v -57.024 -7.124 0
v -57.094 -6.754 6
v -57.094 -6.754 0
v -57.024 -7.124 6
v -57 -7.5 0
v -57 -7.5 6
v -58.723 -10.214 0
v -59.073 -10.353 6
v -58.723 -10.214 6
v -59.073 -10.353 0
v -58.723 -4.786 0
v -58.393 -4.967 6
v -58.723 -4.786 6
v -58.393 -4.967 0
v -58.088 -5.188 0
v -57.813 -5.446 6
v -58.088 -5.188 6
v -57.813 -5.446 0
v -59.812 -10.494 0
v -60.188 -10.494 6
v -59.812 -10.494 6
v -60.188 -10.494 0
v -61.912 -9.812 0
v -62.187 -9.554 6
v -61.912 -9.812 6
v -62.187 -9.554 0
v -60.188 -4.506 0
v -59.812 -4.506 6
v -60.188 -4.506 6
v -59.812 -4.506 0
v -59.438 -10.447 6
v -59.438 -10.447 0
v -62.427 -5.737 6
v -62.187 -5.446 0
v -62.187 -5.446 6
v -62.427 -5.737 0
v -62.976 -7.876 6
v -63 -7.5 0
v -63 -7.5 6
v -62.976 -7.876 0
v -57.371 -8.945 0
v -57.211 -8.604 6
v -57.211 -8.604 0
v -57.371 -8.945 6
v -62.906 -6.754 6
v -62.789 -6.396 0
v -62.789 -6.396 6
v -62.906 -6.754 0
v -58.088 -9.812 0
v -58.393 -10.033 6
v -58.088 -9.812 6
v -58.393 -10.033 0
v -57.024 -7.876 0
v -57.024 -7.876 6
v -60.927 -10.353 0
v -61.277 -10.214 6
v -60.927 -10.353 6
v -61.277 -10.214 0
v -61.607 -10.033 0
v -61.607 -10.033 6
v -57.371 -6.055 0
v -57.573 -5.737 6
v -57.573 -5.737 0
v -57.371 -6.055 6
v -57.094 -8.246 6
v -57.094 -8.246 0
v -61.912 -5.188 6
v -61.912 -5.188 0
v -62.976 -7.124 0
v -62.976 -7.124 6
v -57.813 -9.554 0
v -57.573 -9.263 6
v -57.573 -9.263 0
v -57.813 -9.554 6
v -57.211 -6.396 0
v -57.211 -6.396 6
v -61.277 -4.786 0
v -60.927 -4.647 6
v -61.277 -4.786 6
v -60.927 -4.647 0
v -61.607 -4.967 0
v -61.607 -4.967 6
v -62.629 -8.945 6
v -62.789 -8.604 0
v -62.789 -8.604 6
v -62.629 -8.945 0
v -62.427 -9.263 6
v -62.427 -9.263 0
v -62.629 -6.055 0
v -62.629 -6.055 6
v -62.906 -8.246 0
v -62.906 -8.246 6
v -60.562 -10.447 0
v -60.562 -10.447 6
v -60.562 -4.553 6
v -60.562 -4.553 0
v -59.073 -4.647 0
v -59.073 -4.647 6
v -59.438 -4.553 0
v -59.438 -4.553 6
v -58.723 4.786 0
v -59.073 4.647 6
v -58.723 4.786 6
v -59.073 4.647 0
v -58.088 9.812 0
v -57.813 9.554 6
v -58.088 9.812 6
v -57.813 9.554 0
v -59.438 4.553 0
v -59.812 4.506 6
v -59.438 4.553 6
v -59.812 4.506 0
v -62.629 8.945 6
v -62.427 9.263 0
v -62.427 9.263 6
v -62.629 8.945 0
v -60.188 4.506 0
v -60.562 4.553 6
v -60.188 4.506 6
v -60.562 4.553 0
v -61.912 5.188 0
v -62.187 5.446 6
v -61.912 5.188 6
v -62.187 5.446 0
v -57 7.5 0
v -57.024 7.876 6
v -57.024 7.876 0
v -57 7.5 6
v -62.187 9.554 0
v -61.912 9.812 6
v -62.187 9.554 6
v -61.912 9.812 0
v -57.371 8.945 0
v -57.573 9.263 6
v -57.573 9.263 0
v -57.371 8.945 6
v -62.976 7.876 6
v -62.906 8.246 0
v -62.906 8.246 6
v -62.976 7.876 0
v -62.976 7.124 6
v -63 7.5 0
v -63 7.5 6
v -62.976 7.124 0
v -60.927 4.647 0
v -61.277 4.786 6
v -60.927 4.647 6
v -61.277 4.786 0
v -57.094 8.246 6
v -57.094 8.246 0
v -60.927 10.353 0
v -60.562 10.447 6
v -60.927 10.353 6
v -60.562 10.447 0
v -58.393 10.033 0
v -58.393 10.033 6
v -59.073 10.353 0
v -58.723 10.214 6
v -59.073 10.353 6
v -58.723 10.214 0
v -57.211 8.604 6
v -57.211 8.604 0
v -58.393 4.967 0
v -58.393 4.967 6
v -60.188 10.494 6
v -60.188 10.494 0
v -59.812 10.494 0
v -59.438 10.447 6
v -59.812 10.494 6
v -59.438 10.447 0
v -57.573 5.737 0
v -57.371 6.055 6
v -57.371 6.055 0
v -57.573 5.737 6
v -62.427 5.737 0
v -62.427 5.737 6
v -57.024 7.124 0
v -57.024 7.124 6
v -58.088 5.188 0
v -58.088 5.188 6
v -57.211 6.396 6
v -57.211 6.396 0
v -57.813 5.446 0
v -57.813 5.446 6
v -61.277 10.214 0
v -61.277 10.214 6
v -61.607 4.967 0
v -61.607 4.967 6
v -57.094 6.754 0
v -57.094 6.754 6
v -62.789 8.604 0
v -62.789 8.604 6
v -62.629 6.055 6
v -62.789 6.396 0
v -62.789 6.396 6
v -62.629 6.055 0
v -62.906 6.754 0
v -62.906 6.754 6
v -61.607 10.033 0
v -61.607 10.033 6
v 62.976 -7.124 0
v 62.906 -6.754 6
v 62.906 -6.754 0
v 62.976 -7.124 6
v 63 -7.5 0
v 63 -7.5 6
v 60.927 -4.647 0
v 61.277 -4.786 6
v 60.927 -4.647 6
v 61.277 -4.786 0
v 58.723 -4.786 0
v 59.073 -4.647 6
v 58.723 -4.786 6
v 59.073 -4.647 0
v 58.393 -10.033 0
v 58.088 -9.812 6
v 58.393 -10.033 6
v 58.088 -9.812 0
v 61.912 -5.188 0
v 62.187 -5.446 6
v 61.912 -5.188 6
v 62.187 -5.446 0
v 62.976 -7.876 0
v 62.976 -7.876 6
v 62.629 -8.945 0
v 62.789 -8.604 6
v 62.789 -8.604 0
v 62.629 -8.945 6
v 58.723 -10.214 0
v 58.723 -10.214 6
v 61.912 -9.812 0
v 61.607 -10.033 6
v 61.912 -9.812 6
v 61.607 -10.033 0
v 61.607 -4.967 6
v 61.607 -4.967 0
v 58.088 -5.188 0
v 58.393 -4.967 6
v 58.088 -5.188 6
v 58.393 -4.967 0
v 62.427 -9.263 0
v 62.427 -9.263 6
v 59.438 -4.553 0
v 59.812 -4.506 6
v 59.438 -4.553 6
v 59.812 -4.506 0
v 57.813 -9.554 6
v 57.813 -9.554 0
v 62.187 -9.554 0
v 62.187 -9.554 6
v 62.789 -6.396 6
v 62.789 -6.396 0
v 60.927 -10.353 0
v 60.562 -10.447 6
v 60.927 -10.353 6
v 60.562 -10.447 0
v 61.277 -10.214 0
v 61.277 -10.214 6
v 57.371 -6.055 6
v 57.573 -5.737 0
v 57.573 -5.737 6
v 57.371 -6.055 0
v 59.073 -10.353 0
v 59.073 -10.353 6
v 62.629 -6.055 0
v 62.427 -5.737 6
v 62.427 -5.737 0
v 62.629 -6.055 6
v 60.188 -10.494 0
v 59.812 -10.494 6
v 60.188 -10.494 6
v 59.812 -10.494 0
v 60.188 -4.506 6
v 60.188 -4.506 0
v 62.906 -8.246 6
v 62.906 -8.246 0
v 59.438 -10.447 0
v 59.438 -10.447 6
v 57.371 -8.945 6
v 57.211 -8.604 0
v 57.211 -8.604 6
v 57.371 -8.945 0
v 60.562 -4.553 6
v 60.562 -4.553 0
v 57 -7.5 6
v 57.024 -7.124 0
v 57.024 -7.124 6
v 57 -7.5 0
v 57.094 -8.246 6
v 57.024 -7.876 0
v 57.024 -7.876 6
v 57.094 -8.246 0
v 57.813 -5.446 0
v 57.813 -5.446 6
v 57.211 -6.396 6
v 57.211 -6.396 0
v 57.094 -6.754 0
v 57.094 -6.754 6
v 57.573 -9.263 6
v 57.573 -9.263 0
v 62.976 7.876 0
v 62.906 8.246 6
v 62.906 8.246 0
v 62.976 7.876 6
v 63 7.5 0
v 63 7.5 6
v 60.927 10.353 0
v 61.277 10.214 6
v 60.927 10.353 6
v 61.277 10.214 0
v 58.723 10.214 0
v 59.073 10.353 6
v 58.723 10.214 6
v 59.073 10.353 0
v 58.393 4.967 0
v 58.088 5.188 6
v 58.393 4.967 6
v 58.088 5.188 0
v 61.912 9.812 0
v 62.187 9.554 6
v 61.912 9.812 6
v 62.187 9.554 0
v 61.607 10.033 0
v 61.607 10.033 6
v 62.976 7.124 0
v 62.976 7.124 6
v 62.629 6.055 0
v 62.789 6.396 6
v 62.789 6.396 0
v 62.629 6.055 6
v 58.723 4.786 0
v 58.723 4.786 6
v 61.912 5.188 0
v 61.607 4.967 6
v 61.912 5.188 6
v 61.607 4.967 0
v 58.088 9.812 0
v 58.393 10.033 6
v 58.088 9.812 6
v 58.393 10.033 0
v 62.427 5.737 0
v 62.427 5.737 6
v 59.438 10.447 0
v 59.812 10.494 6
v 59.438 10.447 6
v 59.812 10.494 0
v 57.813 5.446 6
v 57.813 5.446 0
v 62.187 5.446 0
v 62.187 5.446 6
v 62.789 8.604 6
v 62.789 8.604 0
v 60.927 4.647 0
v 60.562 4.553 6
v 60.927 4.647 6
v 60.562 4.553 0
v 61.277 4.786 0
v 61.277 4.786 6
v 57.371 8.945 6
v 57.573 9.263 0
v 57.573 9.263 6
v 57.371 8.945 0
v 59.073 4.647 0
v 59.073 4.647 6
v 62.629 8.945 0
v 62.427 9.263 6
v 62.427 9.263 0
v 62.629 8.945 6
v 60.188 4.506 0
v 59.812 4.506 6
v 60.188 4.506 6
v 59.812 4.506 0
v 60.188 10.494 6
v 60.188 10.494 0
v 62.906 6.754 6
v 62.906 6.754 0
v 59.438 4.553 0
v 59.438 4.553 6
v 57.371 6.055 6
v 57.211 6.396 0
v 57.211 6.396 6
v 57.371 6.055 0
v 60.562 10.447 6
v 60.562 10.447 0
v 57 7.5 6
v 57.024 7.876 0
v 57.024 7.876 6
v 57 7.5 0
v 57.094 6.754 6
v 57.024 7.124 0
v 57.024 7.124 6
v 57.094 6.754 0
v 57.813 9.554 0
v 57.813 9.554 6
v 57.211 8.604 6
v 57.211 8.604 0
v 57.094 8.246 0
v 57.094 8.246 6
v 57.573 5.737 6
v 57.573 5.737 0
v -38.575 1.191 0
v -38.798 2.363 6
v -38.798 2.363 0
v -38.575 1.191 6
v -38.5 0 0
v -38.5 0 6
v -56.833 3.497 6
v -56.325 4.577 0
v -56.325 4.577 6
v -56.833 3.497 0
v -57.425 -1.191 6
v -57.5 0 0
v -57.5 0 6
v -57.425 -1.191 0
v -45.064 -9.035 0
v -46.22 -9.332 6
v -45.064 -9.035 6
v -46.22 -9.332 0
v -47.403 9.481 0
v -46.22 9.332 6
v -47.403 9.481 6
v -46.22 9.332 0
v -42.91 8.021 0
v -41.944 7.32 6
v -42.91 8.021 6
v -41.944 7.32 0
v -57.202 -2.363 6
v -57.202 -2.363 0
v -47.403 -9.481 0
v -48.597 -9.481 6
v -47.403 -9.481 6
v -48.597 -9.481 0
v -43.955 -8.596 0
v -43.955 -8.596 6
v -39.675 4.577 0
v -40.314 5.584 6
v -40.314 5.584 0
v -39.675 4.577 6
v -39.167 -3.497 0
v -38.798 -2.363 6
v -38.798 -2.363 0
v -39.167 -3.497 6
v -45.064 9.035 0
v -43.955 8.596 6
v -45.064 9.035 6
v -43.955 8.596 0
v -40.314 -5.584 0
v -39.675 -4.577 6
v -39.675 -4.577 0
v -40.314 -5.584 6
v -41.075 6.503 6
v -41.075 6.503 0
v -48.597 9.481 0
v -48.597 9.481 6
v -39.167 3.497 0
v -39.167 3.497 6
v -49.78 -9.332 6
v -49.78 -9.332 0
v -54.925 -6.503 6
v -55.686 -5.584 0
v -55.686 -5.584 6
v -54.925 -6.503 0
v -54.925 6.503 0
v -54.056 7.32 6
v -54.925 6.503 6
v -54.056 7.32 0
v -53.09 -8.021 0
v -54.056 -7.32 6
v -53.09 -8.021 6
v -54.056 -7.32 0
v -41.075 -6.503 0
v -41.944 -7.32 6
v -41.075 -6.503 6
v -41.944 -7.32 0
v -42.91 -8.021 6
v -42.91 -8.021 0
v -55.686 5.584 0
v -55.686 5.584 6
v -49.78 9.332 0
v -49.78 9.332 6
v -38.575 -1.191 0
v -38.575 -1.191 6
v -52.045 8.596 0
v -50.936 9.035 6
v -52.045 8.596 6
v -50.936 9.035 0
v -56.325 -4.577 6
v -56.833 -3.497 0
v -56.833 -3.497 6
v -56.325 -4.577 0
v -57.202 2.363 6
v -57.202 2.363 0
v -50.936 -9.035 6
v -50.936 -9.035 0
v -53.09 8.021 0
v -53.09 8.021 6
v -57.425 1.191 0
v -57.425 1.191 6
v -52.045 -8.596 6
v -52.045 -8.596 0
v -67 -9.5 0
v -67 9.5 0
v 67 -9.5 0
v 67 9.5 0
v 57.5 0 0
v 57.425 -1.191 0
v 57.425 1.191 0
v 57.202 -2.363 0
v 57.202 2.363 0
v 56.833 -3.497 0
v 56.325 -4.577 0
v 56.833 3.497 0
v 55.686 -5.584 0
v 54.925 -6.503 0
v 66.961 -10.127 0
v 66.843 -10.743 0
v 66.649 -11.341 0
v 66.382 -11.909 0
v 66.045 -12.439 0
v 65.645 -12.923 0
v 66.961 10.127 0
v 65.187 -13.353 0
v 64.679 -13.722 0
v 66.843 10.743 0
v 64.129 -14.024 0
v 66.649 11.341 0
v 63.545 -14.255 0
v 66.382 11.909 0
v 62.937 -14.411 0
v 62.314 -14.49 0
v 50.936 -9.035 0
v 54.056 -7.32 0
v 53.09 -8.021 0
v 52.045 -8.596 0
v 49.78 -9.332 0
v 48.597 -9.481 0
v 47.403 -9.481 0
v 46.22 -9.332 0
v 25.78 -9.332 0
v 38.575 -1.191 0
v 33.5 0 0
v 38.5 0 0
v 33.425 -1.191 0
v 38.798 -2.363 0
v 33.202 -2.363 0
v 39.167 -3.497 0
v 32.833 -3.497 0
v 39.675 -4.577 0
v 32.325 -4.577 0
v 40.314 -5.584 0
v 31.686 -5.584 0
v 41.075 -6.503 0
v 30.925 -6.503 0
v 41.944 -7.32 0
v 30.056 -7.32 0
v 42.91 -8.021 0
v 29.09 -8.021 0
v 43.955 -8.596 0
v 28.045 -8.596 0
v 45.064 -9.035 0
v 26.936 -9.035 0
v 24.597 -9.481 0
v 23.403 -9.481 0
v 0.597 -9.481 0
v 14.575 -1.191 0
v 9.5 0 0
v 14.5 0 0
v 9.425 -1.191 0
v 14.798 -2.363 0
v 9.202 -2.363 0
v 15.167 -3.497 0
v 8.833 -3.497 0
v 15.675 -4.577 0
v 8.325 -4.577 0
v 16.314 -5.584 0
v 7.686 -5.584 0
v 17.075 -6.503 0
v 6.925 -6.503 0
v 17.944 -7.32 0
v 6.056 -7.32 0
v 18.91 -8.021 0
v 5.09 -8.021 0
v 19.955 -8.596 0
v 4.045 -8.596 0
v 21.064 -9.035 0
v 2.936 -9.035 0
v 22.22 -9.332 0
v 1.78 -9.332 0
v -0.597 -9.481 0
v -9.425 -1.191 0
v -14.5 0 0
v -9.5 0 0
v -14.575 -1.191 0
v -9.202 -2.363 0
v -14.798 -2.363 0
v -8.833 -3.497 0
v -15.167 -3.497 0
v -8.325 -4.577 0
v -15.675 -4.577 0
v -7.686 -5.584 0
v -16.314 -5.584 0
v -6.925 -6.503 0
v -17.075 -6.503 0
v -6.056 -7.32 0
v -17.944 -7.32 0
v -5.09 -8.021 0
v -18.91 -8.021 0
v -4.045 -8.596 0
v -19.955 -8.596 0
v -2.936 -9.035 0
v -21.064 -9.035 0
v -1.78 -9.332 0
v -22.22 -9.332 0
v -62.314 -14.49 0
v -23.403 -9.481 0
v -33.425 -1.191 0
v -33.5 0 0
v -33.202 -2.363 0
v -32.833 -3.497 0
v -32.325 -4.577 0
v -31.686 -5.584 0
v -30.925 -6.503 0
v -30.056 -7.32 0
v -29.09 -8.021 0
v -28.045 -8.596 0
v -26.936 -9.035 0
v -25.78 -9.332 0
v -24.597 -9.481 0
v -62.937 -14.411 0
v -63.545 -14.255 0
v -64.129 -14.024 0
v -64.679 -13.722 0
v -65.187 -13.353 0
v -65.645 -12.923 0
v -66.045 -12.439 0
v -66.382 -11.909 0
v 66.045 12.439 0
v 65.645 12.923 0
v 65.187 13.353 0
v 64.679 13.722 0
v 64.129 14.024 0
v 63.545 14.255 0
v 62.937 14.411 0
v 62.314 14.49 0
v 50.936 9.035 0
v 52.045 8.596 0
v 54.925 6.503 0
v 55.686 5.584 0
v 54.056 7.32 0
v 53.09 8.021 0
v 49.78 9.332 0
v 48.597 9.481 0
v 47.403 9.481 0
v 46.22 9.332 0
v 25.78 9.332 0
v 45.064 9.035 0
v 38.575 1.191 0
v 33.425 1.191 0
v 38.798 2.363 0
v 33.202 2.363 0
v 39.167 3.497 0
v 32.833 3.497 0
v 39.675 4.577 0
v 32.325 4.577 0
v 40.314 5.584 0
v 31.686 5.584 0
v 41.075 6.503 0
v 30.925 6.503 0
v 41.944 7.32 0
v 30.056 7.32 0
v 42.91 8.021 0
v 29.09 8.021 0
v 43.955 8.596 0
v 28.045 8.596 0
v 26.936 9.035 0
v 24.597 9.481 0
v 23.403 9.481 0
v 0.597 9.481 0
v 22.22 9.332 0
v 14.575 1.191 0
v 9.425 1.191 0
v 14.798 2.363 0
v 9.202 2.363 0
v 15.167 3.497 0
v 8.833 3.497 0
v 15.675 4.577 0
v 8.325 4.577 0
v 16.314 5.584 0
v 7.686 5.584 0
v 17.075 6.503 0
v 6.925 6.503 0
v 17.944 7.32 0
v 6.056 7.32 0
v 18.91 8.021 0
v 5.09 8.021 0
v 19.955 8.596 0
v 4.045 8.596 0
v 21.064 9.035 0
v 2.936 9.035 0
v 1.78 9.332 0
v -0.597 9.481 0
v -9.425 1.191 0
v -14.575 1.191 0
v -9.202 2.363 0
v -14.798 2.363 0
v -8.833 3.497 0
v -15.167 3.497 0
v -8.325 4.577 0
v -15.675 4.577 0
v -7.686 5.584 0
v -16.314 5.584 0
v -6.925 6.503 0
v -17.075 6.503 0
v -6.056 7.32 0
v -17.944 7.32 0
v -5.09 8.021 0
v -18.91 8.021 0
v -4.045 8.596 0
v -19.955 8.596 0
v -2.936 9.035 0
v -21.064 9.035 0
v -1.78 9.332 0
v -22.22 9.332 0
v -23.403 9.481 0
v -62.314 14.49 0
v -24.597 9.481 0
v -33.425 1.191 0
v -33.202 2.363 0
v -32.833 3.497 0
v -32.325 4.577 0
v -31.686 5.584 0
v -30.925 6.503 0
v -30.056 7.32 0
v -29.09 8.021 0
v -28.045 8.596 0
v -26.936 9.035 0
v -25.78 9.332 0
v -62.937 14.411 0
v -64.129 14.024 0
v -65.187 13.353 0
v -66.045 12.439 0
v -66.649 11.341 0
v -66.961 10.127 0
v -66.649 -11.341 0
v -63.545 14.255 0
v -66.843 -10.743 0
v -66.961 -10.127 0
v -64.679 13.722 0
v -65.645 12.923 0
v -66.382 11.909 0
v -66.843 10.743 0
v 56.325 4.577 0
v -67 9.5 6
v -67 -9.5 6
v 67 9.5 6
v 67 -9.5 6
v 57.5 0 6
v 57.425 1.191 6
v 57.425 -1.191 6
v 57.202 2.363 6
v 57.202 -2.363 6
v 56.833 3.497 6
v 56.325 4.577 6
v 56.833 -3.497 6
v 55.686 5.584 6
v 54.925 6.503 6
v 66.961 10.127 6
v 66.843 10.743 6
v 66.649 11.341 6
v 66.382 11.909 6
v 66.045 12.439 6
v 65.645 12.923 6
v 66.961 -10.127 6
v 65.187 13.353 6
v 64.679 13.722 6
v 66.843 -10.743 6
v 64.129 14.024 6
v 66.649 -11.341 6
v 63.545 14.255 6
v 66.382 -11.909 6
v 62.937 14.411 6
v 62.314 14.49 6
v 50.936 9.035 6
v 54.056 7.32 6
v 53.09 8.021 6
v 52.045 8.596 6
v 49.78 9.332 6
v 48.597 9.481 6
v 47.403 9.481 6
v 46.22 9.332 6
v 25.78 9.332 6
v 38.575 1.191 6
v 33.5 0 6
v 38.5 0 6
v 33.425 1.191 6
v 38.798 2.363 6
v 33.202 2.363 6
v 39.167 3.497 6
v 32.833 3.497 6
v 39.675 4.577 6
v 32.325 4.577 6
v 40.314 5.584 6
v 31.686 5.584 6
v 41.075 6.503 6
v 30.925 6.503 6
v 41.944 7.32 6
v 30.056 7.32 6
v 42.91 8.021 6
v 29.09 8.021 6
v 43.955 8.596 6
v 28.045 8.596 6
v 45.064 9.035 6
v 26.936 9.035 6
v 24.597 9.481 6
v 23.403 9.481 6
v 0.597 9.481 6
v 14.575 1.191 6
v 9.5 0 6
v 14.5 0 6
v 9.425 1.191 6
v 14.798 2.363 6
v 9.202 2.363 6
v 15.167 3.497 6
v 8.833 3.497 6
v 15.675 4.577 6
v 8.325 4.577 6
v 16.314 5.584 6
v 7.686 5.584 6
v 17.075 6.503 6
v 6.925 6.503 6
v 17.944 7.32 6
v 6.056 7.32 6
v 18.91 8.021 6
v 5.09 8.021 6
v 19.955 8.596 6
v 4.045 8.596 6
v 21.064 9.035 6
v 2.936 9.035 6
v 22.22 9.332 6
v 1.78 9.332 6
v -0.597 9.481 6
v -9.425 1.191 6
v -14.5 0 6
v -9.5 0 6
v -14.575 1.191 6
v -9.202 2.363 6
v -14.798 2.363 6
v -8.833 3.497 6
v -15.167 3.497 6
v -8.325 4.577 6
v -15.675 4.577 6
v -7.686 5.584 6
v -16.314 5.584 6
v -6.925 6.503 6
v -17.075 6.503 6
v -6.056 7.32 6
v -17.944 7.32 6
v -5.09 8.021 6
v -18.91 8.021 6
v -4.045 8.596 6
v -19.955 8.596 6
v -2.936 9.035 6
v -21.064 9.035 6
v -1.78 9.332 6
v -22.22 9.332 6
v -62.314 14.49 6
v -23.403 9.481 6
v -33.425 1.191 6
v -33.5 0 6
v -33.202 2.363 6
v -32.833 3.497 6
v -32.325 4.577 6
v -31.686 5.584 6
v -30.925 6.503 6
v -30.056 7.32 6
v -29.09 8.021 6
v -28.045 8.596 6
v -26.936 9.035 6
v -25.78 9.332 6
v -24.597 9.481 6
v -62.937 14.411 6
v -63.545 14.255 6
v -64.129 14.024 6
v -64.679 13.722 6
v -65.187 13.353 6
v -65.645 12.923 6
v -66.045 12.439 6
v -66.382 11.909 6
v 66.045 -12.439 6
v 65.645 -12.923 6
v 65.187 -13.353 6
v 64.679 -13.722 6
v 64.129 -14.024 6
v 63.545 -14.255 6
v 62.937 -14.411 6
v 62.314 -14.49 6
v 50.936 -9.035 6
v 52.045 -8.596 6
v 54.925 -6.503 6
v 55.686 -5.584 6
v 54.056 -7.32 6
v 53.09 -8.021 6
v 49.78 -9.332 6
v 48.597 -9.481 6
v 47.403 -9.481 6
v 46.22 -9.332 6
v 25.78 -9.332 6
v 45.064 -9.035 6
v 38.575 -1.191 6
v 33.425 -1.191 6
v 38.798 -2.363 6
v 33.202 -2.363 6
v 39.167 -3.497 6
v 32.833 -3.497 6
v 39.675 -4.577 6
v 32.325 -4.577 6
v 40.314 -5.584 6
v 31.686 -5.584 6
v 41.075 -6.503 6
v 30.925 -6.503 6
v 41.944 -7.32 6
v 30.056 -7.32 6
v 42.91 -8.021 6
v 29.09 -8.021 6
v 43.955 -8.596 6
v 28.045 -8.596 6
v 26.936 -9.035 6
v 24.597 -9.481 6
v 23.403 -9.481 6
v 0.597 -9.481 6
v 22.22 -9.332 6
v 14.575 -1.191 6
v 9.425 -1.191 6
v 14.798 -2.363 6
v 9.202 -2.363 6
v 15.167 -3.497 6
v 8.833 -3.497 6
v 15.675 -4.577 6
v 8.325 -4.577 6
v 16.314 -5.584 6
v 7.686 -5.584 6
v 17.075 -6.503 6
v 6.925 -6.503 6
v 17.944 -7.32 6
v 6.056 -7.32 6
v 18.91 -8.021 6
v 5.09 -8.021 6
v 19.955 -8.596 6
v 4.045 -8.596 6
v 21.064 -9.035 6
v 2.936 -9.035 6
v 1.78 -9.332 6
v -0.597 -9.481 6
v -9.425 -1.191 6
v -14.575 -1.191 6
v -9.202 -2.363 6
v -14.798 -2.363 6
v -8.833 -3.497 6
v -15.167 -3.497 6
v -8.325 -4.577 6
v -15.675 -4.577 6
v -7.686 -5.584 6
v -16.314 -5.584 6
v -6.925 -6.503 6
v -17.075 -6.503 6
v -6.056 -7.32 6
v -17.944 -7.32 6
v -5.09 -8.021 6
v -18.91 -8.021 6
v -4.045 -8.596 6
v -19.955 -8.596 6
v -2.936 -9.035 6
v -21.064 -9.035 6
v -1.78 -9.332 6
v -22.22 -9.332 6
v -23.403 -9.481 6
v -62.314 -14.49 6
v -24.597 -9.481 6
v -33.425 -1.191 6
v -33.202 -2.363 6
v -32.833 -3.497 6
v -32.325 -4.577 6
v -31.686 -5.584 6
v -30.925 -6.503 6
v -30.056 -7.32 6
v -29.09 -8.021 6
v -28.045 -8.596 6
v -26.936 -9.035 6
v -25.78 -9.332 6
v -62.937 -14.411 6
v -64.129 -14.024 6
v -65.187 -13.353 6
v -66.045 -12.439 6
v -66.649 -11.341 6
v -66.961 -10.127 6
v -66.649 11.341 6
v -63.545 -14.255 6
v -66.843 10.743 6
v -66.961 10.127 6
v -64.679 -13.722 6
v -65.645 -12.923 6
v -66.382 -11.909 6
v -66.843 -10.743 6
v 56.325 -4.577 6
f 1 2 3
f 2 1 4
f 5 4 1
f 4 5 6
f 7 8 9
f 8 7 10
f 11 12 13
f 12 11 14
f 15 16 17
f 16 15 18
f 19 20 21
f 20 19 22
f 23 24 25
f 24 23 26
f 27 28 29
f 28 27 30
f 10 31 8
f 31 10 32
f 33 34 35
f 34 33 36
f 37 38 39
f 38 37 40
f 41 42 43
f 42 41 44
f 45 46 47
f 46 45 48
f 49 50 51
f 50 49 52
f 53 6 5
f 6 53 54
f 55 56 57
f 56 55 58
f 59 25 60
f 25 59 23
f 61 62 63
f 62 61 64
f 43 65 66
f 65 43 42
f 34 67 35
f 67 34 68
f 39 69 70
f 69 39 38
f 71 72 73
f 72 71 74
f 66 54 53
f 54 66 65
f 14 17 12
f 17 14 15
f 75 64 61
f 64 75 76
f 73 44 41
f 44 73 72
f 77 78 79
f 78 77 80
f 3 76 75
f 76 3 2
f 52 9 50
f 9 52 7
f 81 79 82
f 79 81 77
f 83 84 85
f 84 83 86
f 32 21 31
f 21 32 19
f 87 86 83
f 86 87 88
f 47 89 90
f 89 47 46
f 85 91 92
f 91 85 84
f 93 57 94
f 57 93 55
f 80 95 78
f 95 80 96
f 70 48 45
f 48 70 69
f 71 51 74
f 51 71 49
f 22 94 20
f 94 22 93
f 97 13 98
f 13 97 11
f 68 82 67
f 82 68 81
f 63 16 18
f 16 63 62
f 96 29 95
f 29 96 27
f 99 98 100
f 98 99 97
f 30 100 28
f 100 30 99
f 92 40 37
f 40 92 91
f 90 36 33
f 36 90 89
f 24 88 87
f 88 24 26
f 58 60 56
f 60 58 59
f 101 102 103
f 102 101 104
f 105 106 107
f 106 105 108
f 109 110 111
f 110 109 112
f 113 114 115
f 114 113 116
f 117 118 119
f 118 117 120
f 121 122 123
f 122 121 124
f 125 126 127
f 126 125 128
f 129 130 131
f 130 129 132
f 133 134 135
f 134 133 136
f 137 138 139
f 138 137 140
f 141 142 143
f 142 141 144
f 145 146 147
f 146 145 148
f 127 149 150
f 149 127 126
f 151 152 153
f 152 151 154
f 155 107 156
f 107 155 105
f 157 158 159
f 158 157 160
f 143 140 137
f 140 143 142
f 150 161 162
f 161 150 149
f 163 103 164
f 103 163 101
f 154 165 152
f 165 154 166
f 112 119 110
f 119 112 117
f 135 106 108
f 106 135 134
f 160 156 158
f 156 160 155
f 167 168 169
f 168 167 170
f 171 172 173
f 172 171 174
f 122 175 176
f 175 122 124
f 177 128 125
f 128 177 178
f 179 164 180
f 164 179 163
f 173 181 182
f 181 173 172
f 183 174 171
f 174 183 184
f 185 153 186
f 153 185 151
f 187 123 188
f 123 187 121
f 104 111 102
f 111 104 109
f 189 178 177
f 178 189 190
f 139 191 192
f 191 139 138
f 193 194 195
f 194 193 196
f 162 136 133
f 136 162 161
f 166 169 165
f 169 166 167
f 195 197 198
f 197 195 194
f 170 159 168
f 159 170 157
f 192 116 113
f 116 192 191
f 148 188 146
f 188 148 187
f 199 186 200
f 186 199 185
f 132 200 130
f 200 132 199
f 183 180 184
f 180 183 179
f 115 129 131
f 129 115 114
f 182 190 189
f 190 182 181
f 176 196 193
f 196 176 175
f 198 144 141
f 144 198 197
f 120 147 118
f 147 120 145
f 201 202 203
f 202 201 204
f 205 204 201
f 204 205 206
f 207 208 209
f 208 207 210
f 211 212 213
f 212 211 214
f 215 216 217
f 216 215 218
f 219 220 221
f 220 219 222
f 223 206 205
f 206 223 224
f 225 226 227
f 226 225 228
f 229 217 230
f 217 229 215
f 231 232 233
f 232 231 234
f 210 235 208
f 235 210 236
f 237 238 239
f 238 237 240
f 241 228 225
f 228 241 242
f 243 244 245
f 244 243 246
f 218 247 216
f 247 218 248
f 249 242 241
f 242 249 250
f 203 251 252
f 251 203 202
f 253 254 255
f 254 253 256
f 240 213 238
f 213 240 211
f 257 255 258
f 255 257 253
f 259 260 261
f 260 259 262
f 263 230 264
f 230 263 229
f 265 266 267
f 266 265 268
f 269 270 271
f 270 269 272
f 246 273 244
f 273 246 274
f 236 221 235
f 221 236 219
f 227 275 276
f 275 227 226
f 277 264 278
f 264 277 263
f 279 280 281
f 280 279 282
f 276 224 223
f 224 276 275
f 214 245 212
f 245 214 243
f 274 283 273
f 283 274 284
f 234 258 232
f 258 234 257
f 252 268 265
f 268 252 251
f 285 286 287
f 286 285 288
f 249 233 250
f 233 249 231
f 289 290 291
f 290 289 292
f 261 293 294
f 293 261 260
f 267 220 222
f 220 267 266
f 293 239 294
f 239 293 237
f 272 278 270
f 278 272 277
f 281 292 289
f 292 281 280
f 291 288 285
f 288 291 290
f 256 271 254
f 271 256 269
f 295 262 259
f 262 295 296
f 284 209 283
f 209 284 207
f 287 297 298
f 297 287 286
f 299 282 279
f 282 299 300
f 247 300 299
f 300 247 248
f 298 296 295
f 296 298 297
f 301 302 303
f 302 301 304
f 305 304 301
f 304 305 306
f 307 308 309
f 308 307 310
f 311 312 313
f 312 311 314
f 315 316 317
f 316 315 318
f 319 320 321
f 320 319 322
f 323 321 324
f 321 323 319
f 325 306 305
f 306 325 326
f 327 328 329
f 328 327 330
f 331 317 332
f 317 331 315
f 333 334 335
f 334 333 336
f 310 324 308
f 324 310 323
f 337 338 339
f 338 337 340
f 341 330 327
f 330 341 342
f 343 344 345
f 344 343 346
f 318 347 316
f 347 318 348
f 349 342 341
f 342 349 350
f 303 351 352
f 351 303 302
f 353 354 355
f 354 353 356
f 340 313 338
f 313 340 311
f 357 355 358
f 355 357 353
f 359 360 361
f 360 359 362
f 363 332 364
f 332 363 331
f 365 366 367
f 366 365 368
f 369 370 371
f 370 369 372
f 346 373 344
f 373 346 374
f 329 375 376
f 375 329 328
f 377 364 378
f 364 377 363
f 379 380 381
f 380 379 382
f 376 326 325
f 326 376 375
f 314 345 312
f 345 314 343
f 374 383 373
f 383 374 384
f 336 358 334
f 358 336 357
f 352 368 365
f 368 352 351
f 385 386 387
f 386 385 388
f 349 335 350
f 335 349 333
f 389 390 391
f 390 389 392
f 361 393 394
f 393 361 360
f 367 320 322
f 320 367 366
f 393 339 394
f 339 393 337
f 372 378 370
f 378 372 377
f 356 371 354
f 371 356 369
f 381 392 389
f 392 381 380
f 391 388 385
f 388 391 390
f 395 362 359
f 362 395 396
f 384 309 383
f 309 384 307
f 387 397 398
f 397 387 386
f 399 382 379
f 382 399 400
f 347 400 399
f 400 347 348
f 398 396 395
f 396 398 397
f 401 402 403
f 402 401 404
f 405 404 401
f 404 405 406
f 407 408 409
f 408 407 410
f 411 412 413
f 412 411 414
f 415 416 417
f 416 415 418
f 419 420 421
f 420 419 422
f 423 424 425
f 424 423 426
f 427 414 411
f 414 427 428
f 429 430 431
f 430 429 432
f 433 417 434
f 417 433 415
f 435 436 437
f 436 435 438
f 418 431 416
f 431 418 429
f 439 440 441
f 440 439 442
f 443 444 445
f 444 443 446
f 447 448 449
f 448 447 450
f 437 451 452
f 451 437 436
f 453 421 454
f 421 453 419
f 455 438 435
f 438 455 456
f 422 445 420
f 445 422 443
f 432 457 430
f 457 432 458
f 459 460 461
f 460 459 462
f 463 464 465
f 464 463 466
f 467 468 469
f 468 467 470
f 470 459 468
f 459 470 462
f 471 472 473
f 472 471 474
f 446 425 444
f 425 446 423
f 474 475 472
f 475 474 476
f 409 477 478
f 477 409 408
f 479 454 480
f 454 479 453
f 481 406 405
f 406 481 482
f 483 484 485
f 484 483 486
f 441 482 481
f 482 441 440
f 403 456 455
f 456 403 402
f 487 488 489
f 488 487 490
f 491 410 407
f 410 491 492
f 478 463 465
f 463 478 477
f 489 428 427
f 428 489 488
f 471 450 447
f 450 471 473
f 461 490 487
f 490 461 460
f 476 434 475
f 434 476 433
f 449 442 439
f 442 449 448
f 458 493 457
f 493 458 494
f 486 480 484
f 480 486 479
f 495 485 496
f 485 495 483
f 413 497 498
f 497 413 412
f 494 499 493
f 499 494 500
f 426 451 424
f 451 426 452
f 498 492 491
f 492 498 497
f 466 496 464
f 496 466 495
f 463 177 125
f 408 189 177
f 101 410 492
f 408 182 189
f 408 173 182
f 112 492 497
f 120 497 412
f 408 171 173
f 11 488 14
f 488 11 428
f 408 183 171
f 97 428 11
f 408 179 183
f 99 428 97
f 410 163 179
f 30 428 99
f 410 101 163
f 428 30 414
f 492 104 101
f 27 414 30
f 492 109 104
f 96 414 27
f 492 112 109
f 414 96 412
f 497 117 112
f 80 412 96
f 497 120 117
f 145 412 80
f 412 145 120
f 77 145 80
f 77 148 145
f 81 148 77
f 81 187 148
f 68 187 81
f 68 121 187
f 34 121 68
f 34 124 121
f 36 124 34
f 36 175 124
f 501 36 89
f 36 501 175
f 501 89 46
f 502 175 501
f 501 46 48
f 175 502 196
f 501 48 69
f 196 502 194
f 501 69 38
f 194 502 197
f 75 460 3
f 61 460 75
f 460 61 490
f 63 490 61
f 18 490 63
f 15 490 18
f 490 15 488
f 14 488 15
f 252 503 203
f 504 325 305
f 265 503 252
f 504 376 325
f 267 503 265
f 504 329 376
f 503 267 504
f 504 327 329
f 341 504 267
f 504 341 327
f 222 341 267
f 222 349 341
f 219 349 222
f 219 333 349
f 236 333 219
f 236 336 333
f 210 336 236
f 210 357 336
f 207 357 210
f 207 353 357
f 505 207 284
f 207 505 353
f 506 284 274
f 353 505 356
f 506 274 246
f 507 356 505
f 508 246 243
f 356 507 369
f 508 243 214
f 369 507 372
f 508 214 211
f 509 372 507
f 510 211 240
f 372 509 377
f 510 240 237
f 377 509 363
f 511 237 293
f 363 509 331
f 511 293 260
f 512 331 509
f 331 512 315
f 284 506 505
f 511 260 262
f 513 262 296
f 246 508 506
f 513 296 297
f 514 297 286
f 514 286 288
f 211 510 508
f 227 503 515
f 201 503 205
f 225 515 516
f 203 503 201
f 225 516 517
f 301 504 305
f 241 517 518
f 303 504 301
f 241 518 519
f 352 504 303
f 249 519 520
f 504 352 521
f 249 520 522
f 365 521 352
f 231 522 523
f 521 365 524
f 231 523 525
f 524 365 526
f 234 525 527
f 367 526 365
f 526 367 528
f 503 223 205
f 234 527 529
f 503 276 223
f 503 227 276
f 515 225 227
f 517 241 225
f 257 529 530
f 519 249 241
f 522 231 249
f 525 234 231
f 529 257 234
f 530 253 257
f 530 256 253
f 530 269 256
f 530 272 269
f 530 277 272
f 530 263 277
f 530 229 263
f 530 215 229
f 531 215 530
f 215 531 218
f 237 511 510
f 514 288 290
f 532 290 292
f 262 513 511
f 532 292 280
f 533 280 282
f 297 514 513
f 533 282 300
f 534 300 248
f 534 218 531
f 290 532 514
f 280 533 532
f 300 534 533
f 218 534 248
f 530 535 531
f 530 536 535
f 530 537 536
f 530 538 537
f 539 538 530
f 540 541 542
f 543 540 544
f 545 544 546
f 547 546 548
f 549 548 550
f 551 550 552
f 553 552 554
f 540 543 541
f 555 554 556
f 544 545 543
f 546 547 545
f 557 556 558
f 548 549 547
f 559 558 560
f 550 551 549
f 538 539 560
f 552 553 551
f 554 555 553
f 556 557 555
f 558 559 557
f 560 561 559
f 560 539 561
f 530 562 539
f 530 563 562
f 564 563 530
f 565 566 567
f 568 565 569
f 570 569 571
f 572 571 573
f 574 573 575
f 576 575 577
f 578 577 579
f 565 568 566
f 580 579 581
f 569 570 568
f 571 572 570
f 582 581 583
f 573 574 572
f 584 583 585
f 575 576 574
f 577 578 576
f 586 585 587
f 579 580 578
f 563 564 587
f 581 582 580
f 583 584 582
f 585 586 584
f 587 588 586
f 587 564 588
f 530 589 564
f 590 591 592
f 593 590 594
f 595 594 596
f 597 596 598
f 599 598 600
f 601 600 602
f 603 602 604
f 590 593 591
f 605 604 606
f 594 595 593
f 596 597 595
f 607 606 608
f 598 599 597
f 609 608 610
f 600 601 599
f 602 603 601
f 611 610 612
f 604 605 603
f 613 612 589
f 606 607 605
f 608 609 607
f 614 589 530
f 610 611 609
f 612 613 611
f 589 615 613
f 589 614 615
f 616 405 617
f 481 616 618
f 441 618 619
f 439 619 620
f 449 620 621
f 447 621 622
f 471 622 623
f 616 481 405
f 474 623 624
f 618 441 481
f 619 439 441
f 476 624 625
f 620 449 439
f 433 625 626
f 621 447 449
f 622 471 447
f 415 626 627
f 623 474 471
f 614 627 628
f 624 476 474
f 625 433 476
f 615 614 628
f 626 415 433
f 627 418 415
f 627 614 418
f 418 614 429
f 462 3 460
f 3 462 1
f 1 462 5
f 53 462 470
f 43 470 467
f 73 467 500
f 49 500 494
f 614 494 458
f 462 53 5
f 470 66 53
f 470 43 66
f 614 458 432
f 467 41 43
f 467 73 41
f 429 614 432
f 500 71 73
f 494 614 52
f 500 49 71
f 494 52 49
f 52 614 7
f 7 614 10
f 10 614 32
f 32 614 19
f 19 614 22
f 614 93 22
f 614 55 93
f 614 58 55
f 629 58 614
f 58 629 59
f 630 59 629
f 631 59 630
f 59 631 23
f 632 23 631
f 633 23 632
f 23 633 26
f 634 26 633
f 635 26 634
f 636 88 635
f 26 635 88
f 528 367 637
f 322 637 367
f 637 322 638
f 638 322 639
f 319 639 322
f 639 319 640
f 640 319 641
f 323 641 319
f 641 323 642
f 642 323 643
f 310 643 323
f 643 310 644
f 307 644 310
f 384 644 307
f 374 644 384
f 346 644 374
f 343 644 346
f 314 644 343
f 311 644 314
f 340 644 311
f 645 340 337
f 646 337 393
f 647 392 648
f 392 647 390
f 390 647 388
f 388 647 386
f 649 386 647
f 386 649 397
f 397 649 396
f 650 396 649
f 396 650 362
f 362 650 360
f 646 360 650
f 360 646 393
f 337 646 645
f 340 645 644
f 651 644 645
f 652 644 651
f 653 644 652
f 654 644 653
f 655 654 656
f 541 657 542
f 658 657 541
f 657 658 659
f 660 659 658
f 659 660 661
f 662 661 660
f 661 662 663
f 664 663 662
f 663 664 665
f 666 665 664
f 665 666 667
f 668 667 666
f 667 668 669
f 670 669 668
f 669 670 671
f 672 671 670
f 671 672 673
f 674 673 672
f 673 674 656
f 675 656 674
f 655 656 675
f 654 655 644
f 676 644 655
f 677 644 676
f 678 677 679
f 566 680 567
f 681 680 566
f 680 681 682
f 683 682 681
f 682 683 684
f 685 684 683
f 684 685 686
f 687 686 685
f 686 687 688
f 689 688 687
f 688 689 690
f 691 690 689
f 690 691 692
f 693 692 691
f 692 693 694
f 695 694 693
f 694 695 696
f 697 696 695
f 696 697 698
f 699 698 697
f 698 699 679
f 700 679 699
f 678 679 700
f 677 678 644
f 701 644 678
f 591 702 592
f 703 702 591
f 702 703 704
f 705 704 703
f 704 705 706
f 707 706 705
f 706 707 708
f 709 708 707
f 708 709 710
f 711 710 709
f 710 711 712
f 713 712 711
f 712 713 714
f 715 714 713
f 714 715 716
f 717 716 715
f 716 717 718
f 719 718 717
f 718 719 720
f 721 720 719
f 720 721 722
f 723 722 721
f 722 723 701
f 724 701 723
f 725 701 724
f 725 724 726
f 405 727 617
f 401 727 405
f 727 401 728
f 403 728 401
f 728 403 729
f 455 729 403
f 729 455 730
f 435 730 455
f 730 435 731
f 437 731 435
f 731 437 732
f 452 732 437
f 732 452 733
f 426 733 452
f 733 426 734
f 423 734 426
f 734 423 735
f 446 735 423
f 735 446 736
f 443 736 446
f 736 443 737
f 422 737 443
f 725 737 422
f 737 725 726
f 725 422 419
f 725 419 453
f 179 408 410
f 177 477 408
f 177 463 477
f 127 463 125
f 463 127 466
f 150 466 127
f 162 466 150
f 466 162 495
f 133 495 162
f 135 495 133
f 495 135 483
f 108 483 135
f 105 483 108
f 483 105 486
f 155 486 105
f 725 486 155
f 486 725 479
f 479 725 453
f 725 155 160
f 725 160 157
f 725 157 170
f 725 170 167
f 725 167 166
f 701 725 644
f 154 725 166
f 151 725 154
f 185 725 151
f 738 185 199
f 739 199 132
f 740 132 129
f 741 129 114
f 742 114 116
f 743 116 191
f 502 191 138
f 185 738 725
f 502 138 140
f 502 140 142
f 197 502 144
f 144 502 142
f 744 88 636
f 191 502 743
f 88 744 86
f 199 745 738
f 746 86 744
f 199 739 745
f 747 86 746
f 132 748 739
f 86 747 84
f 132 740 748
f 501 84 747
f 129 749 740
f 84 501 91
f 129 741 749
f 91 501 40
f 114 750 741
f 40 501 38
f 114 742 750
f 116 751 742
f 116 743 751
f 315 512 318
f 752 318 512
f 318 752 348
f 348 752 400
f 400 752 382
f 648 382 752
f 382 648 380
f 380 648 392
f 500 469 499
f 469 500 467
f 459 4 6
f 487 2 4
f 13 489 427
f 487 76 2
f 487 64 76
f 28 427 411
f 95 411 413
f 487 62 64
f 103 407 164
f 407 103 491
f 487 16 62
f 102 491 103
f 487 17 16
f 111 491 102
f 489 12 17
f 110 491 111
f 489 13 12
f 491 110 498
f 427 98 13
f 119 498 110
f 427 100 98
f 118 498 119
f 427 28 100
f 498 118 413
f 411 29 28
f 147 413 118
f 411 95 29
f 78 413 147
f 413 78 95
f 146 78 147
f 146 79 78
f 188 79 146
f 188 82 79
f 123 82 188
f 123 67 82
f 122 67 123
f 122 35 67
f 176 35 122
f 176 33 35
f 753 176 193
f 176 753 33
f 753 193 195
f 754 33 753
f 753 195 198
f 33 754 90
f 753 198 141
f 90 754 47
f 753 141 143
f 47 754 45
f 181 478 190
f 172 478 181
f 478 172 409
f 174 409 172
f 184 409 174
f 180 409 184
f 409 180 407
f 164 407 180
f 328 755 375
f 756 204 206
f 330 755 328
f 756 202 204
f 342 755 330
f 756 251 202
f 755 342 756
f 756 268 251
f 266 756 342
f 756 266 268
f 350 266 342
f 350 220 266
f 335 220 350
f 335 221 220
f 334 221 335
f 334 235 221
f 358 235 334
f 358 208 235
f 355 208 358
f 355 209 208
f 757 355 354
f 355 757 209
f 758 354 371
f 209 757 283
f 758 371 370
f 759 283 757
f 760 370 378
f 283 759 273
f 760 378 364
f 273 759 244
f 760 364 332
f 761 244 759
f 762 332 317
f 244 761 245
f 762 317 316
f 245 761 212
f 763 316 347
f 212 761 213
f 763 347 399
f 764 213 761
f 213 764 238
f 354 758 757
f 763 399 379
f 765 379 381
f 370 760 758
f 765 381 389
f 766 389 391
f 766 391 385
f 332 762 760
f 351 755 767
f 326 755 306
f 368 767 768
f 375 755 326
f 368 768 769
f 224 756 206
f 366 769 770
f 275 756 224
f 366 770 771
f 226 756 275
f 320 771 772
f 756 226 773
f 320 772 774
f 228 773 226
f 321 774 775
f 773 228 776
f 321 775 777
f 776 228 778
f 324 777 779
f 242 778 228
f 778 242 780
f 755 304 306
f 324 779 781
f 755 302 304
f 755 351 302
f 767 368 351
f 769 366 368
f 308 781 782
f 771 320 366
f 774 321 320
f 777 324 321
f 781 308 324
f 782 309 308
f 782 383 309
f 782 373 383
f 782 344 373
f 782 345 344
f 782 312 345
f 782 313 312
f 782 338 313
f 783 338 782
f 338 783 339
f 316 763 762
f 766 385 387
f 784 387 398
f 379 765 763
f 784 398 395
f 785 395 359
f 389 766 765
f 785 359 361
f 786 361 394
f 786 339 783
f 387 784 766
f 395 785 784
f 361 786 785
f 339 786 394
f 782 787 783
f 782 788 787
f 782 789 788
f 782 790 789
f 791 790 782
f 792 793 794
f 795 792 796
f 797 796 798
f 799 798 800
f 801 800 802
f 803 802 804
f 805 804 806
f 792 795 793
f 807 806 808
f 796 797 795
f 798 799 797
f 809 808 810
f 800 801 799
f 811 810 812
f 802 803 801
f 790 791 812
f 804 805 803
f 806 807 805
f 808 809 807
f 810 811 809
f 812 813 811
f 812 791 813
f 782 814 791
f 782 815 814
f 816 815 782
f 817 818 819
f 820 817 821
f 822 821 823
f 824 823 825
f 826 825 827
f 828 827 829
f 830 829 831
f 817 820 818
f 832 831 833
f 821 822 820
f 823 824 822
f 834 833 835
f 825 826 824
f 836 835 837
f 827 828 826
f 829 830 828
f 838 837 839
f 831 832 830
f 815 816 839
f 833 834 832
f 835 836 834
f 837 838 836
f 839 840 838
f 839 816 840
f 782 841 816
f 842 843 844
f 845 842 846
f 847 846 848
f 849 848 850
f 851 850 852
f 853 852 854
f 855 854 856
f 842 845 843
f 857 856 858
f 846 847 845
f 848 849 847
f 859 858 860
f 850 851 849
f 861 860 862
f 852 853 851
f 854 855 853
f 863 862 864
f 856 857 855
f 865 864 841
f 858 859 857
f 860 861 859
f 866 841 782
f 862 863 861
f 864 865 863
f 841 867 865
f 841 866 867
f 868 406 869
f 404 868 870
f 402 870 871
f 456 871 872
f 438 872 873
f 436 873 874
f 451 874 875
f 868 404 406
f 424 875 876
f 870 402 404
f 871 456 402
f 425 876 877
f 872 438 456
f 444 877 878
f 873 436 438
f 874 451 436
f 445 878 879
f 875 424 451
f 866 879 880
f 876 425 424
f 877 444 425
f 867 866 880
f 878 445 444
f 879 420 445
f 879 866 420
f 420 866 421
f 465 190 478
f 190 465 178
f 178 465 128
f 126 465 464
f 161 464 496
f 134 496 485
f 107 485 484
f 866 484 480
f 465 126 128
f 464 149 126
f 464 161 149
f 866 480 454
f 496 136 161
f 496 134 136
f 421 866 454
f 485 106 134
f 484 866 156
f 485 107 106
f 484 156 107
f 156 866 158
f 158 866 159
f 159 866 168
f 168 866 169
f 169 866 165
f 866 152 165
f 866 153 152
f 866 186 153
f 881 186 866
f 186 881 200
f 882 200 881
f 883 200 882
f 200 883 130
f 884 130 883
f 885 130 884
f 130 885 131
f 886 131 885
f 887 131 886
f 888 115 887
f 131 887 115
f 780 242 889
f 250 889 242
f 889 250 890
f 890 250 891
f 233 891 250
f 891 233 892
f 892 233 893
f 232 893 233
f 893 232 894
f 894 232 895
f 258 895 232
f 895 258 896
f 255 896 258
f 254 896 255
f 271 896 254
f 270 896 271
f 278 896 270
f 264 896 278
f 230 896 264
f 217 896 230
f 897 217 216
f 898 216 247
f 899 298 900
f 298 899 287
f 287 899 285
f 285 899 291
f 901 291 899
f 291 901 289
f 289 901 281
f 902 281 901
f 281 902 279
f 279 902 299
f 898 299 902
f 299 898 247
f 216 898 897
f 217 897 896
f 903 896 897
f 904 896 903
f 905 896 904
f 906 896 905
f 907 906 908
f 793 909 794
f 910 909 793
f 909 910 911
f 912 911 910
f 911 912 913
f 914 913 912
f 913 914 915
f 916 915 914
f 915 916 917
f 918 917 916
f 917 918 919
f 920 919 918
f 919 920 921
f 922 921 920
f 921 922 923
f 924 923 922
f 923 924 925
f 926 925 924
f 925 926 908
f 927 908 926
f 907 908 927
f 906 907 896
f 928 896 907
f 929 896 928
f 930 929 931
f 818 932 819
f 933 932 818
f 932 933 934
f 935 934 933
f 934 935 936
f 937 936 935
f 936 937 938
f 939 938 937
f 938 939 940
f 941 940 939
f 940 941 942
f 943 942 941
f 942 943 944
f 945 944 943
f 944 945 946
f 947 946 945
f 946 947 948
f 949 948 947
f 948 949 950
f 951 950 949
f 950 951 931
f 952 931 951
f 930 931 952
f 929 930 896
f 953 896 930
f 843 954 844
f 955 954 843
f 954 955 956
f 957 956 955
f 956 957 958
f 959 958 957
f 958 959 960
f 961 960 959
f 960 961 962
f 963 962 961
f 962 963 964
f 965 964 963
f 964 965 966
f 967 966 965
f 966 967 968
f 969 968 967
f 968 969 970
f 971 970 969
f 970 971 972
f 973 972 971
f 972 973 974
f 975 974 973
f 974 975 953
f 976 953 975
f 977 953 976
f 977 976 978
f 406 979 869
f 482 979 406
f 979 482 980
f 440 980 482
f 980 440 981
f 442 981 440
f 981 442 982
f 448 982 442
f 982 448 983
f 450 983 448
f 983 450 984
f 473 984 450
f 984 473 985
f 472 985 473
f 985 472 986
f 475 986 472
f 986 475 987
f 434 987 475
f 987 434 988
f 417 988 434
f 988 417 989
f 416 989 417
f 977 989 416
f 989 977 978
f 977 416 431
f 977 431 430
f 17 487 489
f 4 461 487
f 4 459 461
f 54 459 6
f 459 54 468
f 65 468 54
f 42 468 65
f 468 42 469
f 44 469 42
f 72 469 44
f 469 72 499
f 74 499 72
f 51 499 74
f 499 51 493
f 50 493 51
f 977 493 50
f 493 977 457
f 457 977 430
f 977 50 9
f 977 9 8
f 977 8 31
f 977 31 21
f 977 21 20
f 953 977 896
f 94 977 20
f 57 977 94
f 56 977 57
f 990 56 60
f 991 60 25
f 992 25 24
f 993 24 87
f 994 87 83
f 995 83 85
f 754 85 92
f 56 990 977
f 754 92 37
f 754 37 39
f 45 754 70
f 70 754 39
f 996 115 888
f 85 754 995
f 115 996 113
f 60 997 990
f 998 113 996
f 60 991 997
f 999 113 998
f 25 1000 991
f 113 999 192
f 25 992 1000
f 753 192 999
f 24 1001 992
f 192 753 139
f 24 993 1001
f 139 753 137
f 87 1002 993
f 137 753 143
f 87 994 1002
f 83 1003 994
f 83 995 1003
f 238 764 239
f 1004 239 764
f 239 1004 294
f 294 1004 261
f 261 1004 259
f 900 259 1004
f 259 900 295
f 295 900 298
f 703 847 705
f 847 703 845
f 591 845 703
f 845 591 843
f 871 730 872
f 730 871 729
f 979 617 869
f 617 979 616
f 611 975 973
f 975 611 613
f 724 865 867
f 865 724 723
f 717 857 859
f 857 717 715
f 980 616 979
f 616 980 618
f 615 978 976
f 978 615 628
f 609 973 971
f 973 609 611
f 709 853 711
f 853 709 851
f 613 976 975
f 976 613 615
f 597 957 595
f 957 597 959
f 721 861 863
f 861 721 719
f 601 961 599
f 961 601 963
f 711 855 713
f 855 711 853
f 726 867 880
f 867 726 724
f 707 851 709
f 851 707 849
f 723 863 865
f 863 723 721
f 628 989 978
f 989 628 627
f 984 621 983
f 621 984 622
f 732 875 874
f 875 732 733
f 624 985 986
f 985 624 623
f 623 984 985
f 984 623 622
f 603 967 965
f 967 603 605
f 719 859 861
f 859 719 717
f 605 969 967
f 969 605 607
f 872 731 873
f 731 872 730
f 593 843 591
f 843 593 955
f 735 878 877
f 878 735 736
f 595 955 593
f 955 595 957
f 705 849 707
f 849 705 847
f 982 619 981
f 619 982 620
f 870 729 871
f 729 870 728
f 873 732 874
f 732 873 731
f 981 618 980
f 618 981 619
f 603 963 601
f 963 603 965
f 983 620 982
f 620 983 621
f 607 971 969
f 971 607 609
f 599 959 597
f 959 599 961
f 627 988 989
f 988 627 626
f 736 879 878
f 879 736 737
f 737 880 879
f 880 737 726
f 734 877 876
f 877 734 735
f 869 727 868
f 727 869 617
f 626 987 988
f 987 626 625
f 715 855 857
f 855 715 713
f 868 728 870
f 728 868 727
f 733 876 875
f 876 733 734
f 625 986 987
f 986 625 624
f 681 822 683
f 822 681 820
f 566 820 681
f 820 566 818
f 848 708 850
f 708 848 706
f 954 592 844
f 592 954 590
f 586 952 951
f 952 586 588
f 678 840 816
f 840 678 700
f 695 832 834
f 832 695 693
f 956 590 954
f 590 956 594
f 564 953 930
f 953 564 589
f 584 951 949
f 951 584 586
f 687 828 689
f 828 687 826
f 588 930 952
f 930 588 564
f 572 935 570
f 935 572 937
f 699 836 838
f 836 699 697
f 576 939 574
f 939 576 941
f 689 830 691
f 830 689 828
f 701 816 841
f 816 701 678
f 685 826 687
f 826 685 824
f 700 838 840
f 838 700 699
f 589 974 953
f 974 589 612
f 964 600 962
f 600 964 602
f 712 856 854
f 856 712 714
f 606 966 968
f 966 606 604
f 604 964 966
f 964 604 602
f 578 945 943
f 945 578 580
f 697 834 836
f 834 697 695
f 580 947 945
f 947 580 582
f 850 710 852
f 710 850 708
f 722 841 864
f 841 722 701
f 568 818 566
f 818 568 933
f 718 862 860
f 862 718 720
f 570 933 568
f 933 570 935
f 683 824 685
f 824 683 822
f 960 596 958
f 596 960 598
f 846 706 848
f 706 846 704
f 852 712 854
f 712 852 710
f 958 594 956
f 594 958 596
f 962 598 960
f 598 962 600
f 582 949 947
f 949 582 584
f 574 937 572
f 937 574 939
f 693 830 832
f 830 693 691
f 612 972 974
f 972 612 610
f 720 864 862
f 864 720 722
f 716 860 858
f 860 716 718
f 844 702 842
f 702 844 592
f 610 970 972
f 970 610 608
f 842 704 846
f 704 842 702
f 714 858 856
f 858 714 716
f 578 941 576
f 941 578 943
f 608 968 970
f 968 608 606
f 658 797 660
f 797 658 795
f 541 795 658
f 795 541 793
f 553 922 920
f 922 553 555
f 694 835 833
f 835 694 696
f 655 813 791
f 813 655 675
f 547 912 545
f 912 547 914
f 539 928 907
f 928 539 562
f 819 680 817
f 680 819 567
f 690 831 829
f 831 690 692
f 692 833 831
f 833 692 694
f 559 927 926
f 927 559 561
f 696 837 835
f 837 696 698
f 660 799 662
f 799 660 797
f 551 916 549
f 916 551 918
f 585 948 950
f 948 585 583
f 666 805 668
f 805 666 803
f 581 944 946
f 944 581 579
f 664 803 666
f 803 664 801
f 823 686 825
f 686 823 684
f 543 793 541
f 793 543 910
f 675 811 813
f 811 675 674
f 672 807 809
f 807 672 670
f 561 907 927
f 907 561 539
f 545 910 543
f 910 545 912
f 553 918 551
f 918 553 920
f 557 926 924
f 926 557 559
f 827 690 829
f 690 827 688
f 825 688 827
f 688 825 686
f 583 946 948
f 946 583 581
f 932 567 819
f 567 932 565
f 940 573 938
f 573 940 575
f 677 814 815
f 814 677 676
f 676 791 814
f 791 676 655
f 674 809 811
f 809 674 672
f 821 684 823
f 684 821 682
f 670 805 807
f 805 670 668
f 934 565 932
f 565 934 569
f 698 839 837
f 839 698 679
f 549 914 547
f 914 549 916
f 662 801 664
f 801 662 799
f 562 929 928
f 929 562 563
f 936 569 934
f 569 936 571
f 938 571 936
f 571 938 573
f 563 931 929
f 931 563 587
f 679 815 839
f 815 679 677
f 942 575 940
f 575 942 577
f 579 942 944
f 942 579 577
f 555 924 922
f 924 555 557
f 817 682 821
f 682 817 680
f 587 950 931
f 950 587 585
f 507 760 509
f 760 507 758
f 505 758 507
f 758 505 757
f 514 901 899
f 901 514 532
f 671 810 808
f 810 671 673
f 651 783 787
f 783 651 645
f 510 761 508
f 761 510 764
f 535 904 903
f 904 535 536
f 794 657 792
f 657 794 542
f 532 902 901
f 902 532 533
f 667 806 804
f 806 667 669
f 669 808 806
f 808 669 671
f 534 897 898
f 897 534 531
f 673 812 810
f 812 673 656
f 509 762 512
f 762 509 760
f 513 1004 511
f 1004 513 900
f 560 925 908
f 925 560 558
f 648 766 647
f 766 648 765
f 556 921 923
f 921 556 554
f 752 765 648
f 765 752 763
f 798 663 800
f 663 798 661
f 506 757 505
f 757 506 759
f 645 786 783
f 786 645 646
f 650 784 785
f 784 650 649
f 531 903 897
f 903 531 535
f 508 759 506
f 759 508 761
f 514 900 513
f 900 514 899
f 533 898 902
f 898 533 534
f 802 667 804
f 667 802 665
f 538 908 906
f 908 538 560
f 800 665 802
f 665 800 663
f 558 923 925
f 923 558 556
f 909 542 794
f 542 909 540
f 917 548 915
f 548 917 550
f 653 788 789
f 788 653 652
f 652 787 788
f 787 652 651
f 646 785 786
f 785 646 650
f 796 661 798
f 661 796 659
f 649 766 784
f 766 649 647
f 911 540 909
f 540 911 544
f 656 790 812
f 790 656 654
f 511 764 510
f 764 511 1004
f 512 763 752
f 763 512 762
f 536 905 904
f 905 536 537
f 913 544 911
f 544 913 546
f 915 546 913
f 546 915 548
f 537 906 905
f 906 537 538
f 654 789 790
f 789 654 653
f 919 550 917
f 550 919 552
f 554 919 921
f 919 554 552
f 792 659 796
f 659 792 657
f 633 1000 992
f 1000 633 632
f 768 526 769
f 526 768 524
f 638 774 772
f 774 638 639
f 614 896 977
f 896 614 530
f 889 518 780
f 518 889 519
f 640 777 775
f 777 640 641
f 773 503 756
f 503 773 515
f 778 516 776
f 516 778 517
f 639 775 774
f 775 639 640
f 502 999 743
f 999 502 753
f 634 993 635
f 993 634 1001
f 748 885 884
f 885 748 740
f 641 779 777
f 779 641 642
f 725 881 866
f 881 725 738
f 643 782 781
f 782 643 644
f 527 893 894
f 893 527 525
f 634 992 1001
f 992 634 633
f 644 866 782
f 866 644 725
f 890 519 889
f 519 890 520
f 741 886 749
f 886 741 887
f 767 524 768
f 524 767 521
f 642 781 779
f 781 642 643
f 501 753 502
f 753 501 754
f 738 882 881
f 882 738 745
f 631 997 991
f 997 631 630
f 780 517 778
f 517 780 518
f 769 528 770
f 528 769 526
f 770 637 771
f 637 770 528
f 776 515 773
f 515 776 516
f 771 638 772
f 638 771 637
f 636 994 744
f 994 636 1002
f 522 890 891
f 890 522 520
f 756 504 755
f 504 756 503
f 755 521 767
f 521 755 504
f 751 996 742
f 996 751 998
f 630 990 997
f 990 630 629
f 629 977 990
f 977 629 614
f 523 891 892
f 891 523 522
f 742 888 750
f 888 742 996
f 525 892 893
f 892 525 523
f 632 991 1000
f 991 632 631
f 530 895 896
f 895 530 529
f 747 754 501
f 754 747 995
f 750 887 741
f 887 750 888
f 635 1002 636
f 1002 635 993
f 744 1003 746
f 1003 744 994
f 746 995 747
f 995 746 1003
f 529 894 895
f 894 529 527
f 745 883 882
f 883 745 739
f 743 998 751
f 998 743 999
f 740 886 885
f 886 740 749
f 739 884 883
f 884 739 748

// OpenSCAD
$fn = 50;


difference() {
	union() {
		hull() {
			translate(v = [-62.0000000000, 9.5000000000, 0]) {
				cylinder(h = 6, r = 5);
			}
			translate(v = [62.0000000000, 9.5000000000, 0]) {
				cylinder(h = 6, r = 5);
			}
			translate(v = [-62.0000000000, -9.5000000000, 0]) {
				cylinder(h = 6, r = 5);
			}
			translate(v = [62.0000000000, -9.5000000000, 0]) {
				cylinder(h = 6, r = 5);
			}
		}
	}
	union() {
		#translate(v = [-60.0000000000, -7.5000000000, -100.0000000000]) {
			cylinder(h = 200, r = 3.0000000000);
		}
		#translate(v = [-60.0000000000, 7.5000000000, -100.0000000000]) {
			cylinder(h = 200, r = 3.0000000000);
		}
		#translate(v = [60.0000000000, -7.5000000000, -100.0000000000]) {
			cylinder(h = 200, r = 3.0000000000);
		}
		#translate(v = [60.0000000000, 7.5000000000, -100.0000000000]) {
			cylinder(h = 200, r = 3.0000000000);
		}
		#translate(v = [-48.0000000000, 0, 0]) {
			cylinder(h = 6, r = 9.5000000000);
		}
		#translate(v = [-24.0000000000, 0, 0]) {
			cylinder(h = 6, r = 9.5000000000);
		}
		#cylinder(h = 6, r = 9.5000000000);
		#translate(v = [24.0000000000, 0, 0]) {
			cylinder(h = 6, r = 9.5000000000);
		}
		#translate(v = [48.0000000000, 0, 0]) {
			cylinder(h = 6, r = 9.5000000000);
		}
	}
}
